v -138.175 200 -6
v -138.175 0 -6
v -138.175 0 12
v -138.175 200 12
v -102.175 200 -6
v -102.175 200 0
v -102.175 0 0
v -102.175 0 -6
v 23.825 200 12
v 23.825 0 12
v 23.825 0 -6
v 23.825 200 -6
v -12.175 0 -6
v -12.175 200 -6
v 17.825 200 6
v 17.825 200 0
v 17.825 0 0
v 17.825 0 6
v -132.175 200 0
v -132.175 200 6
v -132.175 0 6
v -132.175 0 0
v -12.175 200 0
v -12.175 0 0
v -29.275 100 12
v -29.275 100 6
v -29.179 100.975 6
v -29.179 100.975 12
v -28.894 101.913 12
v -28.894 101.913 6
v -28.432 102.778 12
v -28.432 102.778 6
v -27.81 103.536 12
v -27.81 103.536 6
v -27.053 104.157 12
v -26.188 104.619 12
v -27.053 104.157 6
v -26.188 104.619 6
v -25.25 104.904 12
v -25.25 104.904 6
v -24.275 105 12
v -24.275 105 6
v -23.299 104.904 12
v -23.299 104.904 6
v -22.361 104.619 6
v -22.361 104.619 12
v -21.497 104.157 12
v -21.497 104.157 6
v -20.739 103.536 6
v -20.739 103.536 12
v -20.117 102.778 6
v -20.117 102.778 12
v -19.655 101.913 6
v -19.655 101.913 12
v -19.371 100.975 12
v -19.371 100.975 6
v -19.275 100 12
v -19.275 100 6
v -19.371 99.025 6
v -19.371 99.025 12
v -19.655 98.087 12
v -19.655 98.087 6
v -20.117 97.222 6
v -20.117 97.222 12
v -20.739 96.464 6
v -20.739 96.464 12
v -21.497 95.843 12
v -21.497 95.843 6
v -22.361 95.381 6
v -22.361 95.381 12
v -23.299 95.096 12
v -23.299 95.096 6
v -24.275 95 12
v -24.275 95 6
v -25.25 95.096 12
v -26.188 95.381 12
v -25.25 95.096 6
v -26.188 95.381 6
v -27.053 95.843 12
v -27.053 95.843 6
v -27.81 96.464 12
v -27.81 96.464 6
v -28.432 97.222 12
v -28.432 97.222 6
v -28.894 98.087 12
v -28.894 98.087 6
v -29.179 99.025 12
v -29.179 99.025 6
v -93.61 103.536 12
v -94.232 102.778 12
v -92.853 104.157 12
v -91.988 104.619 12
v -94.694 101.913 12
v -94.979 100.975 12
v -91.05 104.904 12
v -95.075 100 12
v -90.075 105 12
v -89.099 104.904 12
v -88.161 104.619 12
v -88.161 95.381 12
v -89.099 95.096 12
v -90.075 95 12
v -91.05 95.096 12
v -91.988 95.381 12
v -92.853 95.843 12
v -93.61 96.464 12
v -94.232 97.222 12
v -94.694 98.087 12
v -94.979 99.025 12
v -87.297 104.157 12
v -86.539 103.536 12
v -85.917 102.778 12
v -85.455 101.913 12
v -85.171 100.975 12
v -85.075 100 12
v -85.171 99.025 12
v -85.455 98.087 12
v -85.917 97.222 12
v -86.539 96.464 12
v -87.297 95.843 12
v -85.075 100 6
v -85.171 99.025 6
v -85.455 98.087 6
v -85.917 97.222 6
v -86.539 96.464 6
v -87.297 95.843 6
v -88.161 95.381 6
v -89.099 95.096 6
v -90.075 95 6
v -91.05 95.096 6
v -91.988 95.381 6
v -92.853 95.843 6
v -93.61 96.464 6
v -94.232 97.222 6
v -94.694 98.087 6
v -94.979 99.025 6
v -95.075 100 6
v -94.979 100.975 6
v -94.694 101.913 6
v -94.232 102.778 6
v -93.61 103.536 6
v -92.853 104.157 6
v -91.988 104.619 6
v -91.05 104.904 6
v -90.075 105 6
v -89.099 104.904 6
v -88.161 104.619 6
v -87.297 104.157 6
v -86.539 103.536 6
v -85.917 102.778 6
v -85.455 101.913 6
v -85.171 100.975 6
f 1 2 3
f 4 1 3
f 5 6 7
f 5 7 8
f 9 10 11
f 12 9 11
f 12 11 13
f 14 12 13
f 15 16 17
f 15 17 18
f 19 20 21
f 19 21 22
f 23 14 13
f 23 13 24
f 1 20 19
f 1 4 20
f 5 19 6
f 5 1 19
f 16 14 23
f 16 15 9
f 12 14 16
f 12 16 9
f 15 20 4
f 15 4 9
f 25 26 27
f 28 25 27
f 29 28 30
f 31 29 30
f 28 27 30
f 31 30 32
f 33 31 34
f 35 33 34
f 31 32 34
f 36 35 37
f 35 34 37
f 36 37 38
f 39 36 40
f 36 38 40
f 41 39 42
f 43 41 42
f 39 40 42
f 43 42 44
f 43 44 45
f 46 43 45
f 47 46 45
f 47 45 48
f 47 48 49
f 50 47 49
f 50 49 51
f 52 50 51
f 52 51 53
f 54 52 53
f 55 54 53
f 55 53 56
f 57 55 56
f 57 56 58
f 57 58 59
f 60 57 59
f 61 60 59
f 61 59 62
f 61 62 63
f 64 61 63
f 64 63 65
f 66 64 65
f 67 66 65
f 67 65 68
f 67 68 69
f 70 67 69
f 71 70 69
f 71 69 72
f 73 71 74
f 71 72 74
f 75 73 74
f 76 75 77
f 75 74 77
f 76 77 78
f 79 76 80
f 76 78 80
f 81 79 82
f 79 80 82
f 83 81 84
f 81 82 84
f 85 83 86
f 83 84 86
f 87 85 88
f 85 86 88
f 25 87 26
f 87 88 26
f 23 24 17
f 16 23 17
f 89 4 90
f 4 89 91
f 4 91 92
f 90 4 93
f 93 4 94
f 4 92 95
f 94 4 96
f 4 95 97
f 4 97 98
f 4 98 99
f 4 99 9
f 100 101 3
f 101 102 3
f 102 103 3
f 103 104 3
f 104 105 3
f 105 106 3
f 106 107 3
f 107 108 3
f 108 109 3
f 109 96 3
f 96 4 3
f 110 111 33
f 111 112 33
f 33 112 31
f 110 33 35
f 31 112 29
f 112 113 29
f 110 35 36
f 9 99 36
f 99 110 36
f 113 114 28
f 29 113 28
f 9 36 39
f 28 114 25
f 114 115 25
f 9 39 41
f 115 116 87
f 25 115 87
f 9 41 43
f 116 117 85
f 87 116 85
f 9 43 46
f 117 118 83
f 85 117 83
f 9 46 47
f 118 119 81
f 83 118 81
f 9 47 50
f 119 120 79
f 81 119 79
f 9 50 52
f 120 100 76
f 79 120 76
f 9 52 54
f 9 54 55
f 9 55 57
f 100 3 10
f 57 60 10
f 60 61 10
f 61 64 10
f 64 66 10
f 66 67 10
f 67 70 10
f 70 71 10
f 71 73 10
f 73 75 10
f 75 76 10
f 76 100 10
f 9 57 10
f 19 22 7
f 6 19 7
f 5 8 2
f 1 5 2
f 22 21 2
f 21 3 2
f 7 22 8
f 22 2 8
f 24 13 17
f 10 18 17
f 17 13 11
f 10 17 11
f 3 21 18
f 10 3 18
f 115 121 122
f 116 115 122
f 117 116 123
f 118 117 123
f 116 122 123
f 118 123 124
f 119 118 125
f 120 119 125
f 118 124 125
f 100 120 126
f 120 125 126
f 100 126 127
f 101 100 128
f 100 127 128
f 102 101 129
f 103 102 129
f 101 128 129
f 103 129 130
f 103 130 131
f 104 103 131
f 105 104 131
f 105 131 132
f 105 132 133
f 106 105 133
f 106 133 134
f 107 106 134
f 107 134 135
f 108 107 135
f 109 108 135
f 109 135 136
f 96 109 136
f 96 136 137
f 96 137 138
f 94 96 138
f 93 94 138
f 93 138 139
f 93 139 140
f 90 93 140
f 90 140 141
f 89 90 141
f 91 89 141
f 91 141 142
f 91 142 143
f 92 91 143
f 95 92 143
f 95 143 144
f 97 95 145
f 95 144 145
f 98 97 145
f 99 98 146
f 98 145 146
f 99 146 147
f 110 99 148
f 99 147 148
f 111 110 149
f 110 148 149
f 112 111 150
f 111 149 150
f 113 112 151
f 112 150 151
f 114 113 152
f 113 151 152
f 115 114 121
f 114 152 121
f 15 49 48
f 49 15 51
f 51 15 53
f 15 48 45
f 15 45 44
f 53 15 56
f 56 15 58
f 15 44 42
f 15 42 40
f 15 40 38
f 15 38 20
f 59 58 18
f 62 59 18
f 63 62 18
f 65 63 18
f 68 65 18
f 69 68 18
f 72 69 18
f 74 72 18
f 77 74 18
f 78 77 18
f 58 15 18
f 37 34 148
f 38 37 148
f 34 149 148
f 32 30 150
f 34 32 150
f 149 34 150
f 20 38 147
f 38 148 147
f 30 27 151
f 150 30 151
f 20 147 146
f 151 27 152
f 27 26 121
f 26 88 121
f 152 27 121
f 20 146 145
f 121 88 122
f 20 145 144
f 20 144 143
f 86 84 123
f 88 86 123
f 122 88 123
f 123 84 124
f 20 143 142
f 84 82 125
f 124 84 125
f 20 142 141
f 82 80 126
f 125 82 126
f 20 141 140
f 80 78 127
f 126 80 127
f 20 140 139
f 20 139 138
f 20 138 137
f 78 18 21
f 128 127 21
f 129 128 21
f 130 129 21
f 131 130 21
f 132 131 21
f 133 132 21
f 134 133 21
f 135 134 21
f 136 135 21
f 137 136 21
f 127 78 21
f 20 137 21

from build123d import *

# Parameters (mm, degrees)
BOSS_EXTRUDE1_DEPTH = 200
SKETCH2_R           = 5
CUT_EXTRUDE1_DEPTH  = 244.385010939


with BuildPart() as part:
    # Sketch1 → Boss-Extrude1 (new body)
    with BuildSketch(Plane(origin=(0, 0, 0), x_dir=(1, 0, 0), z_dir=(0, 1, 0))):
        Polygon((-12.174757282, 0), (17.825242718, 0), (17.825242718, -6), (-132.174757282, -6), (-132.174757282, 0), (-102.174757282, 0), (-102.174757282, 6), (-138.174757282, 6), (-138.174757282, -12), (23.825242718, -12), (23.825242718, 6), (-12.174757282, 6), align=None)
    extrude(amount=BOSS_EXTRUDE1_DEPTH)

    # Sketch2 → Cut-Extrude1 (cut, through all)
    with BuildSketch(Plane(origin=(0, 0, 6), x_dir=(-1, 0, 0), z_dir=(0, 0, -1))):
        with Locations((24.274757282, 100)):
            Circle(SKETCH2_R)
        with Locations(Location((90.074757282, 100, 0), (0, 0, 180))):
            Circle(SKETCH2_R)
    extrude(amount=-CUT_EXTRUDE1_DEPTH, mode=Mode.SUBTRACT)


solid = part.part
